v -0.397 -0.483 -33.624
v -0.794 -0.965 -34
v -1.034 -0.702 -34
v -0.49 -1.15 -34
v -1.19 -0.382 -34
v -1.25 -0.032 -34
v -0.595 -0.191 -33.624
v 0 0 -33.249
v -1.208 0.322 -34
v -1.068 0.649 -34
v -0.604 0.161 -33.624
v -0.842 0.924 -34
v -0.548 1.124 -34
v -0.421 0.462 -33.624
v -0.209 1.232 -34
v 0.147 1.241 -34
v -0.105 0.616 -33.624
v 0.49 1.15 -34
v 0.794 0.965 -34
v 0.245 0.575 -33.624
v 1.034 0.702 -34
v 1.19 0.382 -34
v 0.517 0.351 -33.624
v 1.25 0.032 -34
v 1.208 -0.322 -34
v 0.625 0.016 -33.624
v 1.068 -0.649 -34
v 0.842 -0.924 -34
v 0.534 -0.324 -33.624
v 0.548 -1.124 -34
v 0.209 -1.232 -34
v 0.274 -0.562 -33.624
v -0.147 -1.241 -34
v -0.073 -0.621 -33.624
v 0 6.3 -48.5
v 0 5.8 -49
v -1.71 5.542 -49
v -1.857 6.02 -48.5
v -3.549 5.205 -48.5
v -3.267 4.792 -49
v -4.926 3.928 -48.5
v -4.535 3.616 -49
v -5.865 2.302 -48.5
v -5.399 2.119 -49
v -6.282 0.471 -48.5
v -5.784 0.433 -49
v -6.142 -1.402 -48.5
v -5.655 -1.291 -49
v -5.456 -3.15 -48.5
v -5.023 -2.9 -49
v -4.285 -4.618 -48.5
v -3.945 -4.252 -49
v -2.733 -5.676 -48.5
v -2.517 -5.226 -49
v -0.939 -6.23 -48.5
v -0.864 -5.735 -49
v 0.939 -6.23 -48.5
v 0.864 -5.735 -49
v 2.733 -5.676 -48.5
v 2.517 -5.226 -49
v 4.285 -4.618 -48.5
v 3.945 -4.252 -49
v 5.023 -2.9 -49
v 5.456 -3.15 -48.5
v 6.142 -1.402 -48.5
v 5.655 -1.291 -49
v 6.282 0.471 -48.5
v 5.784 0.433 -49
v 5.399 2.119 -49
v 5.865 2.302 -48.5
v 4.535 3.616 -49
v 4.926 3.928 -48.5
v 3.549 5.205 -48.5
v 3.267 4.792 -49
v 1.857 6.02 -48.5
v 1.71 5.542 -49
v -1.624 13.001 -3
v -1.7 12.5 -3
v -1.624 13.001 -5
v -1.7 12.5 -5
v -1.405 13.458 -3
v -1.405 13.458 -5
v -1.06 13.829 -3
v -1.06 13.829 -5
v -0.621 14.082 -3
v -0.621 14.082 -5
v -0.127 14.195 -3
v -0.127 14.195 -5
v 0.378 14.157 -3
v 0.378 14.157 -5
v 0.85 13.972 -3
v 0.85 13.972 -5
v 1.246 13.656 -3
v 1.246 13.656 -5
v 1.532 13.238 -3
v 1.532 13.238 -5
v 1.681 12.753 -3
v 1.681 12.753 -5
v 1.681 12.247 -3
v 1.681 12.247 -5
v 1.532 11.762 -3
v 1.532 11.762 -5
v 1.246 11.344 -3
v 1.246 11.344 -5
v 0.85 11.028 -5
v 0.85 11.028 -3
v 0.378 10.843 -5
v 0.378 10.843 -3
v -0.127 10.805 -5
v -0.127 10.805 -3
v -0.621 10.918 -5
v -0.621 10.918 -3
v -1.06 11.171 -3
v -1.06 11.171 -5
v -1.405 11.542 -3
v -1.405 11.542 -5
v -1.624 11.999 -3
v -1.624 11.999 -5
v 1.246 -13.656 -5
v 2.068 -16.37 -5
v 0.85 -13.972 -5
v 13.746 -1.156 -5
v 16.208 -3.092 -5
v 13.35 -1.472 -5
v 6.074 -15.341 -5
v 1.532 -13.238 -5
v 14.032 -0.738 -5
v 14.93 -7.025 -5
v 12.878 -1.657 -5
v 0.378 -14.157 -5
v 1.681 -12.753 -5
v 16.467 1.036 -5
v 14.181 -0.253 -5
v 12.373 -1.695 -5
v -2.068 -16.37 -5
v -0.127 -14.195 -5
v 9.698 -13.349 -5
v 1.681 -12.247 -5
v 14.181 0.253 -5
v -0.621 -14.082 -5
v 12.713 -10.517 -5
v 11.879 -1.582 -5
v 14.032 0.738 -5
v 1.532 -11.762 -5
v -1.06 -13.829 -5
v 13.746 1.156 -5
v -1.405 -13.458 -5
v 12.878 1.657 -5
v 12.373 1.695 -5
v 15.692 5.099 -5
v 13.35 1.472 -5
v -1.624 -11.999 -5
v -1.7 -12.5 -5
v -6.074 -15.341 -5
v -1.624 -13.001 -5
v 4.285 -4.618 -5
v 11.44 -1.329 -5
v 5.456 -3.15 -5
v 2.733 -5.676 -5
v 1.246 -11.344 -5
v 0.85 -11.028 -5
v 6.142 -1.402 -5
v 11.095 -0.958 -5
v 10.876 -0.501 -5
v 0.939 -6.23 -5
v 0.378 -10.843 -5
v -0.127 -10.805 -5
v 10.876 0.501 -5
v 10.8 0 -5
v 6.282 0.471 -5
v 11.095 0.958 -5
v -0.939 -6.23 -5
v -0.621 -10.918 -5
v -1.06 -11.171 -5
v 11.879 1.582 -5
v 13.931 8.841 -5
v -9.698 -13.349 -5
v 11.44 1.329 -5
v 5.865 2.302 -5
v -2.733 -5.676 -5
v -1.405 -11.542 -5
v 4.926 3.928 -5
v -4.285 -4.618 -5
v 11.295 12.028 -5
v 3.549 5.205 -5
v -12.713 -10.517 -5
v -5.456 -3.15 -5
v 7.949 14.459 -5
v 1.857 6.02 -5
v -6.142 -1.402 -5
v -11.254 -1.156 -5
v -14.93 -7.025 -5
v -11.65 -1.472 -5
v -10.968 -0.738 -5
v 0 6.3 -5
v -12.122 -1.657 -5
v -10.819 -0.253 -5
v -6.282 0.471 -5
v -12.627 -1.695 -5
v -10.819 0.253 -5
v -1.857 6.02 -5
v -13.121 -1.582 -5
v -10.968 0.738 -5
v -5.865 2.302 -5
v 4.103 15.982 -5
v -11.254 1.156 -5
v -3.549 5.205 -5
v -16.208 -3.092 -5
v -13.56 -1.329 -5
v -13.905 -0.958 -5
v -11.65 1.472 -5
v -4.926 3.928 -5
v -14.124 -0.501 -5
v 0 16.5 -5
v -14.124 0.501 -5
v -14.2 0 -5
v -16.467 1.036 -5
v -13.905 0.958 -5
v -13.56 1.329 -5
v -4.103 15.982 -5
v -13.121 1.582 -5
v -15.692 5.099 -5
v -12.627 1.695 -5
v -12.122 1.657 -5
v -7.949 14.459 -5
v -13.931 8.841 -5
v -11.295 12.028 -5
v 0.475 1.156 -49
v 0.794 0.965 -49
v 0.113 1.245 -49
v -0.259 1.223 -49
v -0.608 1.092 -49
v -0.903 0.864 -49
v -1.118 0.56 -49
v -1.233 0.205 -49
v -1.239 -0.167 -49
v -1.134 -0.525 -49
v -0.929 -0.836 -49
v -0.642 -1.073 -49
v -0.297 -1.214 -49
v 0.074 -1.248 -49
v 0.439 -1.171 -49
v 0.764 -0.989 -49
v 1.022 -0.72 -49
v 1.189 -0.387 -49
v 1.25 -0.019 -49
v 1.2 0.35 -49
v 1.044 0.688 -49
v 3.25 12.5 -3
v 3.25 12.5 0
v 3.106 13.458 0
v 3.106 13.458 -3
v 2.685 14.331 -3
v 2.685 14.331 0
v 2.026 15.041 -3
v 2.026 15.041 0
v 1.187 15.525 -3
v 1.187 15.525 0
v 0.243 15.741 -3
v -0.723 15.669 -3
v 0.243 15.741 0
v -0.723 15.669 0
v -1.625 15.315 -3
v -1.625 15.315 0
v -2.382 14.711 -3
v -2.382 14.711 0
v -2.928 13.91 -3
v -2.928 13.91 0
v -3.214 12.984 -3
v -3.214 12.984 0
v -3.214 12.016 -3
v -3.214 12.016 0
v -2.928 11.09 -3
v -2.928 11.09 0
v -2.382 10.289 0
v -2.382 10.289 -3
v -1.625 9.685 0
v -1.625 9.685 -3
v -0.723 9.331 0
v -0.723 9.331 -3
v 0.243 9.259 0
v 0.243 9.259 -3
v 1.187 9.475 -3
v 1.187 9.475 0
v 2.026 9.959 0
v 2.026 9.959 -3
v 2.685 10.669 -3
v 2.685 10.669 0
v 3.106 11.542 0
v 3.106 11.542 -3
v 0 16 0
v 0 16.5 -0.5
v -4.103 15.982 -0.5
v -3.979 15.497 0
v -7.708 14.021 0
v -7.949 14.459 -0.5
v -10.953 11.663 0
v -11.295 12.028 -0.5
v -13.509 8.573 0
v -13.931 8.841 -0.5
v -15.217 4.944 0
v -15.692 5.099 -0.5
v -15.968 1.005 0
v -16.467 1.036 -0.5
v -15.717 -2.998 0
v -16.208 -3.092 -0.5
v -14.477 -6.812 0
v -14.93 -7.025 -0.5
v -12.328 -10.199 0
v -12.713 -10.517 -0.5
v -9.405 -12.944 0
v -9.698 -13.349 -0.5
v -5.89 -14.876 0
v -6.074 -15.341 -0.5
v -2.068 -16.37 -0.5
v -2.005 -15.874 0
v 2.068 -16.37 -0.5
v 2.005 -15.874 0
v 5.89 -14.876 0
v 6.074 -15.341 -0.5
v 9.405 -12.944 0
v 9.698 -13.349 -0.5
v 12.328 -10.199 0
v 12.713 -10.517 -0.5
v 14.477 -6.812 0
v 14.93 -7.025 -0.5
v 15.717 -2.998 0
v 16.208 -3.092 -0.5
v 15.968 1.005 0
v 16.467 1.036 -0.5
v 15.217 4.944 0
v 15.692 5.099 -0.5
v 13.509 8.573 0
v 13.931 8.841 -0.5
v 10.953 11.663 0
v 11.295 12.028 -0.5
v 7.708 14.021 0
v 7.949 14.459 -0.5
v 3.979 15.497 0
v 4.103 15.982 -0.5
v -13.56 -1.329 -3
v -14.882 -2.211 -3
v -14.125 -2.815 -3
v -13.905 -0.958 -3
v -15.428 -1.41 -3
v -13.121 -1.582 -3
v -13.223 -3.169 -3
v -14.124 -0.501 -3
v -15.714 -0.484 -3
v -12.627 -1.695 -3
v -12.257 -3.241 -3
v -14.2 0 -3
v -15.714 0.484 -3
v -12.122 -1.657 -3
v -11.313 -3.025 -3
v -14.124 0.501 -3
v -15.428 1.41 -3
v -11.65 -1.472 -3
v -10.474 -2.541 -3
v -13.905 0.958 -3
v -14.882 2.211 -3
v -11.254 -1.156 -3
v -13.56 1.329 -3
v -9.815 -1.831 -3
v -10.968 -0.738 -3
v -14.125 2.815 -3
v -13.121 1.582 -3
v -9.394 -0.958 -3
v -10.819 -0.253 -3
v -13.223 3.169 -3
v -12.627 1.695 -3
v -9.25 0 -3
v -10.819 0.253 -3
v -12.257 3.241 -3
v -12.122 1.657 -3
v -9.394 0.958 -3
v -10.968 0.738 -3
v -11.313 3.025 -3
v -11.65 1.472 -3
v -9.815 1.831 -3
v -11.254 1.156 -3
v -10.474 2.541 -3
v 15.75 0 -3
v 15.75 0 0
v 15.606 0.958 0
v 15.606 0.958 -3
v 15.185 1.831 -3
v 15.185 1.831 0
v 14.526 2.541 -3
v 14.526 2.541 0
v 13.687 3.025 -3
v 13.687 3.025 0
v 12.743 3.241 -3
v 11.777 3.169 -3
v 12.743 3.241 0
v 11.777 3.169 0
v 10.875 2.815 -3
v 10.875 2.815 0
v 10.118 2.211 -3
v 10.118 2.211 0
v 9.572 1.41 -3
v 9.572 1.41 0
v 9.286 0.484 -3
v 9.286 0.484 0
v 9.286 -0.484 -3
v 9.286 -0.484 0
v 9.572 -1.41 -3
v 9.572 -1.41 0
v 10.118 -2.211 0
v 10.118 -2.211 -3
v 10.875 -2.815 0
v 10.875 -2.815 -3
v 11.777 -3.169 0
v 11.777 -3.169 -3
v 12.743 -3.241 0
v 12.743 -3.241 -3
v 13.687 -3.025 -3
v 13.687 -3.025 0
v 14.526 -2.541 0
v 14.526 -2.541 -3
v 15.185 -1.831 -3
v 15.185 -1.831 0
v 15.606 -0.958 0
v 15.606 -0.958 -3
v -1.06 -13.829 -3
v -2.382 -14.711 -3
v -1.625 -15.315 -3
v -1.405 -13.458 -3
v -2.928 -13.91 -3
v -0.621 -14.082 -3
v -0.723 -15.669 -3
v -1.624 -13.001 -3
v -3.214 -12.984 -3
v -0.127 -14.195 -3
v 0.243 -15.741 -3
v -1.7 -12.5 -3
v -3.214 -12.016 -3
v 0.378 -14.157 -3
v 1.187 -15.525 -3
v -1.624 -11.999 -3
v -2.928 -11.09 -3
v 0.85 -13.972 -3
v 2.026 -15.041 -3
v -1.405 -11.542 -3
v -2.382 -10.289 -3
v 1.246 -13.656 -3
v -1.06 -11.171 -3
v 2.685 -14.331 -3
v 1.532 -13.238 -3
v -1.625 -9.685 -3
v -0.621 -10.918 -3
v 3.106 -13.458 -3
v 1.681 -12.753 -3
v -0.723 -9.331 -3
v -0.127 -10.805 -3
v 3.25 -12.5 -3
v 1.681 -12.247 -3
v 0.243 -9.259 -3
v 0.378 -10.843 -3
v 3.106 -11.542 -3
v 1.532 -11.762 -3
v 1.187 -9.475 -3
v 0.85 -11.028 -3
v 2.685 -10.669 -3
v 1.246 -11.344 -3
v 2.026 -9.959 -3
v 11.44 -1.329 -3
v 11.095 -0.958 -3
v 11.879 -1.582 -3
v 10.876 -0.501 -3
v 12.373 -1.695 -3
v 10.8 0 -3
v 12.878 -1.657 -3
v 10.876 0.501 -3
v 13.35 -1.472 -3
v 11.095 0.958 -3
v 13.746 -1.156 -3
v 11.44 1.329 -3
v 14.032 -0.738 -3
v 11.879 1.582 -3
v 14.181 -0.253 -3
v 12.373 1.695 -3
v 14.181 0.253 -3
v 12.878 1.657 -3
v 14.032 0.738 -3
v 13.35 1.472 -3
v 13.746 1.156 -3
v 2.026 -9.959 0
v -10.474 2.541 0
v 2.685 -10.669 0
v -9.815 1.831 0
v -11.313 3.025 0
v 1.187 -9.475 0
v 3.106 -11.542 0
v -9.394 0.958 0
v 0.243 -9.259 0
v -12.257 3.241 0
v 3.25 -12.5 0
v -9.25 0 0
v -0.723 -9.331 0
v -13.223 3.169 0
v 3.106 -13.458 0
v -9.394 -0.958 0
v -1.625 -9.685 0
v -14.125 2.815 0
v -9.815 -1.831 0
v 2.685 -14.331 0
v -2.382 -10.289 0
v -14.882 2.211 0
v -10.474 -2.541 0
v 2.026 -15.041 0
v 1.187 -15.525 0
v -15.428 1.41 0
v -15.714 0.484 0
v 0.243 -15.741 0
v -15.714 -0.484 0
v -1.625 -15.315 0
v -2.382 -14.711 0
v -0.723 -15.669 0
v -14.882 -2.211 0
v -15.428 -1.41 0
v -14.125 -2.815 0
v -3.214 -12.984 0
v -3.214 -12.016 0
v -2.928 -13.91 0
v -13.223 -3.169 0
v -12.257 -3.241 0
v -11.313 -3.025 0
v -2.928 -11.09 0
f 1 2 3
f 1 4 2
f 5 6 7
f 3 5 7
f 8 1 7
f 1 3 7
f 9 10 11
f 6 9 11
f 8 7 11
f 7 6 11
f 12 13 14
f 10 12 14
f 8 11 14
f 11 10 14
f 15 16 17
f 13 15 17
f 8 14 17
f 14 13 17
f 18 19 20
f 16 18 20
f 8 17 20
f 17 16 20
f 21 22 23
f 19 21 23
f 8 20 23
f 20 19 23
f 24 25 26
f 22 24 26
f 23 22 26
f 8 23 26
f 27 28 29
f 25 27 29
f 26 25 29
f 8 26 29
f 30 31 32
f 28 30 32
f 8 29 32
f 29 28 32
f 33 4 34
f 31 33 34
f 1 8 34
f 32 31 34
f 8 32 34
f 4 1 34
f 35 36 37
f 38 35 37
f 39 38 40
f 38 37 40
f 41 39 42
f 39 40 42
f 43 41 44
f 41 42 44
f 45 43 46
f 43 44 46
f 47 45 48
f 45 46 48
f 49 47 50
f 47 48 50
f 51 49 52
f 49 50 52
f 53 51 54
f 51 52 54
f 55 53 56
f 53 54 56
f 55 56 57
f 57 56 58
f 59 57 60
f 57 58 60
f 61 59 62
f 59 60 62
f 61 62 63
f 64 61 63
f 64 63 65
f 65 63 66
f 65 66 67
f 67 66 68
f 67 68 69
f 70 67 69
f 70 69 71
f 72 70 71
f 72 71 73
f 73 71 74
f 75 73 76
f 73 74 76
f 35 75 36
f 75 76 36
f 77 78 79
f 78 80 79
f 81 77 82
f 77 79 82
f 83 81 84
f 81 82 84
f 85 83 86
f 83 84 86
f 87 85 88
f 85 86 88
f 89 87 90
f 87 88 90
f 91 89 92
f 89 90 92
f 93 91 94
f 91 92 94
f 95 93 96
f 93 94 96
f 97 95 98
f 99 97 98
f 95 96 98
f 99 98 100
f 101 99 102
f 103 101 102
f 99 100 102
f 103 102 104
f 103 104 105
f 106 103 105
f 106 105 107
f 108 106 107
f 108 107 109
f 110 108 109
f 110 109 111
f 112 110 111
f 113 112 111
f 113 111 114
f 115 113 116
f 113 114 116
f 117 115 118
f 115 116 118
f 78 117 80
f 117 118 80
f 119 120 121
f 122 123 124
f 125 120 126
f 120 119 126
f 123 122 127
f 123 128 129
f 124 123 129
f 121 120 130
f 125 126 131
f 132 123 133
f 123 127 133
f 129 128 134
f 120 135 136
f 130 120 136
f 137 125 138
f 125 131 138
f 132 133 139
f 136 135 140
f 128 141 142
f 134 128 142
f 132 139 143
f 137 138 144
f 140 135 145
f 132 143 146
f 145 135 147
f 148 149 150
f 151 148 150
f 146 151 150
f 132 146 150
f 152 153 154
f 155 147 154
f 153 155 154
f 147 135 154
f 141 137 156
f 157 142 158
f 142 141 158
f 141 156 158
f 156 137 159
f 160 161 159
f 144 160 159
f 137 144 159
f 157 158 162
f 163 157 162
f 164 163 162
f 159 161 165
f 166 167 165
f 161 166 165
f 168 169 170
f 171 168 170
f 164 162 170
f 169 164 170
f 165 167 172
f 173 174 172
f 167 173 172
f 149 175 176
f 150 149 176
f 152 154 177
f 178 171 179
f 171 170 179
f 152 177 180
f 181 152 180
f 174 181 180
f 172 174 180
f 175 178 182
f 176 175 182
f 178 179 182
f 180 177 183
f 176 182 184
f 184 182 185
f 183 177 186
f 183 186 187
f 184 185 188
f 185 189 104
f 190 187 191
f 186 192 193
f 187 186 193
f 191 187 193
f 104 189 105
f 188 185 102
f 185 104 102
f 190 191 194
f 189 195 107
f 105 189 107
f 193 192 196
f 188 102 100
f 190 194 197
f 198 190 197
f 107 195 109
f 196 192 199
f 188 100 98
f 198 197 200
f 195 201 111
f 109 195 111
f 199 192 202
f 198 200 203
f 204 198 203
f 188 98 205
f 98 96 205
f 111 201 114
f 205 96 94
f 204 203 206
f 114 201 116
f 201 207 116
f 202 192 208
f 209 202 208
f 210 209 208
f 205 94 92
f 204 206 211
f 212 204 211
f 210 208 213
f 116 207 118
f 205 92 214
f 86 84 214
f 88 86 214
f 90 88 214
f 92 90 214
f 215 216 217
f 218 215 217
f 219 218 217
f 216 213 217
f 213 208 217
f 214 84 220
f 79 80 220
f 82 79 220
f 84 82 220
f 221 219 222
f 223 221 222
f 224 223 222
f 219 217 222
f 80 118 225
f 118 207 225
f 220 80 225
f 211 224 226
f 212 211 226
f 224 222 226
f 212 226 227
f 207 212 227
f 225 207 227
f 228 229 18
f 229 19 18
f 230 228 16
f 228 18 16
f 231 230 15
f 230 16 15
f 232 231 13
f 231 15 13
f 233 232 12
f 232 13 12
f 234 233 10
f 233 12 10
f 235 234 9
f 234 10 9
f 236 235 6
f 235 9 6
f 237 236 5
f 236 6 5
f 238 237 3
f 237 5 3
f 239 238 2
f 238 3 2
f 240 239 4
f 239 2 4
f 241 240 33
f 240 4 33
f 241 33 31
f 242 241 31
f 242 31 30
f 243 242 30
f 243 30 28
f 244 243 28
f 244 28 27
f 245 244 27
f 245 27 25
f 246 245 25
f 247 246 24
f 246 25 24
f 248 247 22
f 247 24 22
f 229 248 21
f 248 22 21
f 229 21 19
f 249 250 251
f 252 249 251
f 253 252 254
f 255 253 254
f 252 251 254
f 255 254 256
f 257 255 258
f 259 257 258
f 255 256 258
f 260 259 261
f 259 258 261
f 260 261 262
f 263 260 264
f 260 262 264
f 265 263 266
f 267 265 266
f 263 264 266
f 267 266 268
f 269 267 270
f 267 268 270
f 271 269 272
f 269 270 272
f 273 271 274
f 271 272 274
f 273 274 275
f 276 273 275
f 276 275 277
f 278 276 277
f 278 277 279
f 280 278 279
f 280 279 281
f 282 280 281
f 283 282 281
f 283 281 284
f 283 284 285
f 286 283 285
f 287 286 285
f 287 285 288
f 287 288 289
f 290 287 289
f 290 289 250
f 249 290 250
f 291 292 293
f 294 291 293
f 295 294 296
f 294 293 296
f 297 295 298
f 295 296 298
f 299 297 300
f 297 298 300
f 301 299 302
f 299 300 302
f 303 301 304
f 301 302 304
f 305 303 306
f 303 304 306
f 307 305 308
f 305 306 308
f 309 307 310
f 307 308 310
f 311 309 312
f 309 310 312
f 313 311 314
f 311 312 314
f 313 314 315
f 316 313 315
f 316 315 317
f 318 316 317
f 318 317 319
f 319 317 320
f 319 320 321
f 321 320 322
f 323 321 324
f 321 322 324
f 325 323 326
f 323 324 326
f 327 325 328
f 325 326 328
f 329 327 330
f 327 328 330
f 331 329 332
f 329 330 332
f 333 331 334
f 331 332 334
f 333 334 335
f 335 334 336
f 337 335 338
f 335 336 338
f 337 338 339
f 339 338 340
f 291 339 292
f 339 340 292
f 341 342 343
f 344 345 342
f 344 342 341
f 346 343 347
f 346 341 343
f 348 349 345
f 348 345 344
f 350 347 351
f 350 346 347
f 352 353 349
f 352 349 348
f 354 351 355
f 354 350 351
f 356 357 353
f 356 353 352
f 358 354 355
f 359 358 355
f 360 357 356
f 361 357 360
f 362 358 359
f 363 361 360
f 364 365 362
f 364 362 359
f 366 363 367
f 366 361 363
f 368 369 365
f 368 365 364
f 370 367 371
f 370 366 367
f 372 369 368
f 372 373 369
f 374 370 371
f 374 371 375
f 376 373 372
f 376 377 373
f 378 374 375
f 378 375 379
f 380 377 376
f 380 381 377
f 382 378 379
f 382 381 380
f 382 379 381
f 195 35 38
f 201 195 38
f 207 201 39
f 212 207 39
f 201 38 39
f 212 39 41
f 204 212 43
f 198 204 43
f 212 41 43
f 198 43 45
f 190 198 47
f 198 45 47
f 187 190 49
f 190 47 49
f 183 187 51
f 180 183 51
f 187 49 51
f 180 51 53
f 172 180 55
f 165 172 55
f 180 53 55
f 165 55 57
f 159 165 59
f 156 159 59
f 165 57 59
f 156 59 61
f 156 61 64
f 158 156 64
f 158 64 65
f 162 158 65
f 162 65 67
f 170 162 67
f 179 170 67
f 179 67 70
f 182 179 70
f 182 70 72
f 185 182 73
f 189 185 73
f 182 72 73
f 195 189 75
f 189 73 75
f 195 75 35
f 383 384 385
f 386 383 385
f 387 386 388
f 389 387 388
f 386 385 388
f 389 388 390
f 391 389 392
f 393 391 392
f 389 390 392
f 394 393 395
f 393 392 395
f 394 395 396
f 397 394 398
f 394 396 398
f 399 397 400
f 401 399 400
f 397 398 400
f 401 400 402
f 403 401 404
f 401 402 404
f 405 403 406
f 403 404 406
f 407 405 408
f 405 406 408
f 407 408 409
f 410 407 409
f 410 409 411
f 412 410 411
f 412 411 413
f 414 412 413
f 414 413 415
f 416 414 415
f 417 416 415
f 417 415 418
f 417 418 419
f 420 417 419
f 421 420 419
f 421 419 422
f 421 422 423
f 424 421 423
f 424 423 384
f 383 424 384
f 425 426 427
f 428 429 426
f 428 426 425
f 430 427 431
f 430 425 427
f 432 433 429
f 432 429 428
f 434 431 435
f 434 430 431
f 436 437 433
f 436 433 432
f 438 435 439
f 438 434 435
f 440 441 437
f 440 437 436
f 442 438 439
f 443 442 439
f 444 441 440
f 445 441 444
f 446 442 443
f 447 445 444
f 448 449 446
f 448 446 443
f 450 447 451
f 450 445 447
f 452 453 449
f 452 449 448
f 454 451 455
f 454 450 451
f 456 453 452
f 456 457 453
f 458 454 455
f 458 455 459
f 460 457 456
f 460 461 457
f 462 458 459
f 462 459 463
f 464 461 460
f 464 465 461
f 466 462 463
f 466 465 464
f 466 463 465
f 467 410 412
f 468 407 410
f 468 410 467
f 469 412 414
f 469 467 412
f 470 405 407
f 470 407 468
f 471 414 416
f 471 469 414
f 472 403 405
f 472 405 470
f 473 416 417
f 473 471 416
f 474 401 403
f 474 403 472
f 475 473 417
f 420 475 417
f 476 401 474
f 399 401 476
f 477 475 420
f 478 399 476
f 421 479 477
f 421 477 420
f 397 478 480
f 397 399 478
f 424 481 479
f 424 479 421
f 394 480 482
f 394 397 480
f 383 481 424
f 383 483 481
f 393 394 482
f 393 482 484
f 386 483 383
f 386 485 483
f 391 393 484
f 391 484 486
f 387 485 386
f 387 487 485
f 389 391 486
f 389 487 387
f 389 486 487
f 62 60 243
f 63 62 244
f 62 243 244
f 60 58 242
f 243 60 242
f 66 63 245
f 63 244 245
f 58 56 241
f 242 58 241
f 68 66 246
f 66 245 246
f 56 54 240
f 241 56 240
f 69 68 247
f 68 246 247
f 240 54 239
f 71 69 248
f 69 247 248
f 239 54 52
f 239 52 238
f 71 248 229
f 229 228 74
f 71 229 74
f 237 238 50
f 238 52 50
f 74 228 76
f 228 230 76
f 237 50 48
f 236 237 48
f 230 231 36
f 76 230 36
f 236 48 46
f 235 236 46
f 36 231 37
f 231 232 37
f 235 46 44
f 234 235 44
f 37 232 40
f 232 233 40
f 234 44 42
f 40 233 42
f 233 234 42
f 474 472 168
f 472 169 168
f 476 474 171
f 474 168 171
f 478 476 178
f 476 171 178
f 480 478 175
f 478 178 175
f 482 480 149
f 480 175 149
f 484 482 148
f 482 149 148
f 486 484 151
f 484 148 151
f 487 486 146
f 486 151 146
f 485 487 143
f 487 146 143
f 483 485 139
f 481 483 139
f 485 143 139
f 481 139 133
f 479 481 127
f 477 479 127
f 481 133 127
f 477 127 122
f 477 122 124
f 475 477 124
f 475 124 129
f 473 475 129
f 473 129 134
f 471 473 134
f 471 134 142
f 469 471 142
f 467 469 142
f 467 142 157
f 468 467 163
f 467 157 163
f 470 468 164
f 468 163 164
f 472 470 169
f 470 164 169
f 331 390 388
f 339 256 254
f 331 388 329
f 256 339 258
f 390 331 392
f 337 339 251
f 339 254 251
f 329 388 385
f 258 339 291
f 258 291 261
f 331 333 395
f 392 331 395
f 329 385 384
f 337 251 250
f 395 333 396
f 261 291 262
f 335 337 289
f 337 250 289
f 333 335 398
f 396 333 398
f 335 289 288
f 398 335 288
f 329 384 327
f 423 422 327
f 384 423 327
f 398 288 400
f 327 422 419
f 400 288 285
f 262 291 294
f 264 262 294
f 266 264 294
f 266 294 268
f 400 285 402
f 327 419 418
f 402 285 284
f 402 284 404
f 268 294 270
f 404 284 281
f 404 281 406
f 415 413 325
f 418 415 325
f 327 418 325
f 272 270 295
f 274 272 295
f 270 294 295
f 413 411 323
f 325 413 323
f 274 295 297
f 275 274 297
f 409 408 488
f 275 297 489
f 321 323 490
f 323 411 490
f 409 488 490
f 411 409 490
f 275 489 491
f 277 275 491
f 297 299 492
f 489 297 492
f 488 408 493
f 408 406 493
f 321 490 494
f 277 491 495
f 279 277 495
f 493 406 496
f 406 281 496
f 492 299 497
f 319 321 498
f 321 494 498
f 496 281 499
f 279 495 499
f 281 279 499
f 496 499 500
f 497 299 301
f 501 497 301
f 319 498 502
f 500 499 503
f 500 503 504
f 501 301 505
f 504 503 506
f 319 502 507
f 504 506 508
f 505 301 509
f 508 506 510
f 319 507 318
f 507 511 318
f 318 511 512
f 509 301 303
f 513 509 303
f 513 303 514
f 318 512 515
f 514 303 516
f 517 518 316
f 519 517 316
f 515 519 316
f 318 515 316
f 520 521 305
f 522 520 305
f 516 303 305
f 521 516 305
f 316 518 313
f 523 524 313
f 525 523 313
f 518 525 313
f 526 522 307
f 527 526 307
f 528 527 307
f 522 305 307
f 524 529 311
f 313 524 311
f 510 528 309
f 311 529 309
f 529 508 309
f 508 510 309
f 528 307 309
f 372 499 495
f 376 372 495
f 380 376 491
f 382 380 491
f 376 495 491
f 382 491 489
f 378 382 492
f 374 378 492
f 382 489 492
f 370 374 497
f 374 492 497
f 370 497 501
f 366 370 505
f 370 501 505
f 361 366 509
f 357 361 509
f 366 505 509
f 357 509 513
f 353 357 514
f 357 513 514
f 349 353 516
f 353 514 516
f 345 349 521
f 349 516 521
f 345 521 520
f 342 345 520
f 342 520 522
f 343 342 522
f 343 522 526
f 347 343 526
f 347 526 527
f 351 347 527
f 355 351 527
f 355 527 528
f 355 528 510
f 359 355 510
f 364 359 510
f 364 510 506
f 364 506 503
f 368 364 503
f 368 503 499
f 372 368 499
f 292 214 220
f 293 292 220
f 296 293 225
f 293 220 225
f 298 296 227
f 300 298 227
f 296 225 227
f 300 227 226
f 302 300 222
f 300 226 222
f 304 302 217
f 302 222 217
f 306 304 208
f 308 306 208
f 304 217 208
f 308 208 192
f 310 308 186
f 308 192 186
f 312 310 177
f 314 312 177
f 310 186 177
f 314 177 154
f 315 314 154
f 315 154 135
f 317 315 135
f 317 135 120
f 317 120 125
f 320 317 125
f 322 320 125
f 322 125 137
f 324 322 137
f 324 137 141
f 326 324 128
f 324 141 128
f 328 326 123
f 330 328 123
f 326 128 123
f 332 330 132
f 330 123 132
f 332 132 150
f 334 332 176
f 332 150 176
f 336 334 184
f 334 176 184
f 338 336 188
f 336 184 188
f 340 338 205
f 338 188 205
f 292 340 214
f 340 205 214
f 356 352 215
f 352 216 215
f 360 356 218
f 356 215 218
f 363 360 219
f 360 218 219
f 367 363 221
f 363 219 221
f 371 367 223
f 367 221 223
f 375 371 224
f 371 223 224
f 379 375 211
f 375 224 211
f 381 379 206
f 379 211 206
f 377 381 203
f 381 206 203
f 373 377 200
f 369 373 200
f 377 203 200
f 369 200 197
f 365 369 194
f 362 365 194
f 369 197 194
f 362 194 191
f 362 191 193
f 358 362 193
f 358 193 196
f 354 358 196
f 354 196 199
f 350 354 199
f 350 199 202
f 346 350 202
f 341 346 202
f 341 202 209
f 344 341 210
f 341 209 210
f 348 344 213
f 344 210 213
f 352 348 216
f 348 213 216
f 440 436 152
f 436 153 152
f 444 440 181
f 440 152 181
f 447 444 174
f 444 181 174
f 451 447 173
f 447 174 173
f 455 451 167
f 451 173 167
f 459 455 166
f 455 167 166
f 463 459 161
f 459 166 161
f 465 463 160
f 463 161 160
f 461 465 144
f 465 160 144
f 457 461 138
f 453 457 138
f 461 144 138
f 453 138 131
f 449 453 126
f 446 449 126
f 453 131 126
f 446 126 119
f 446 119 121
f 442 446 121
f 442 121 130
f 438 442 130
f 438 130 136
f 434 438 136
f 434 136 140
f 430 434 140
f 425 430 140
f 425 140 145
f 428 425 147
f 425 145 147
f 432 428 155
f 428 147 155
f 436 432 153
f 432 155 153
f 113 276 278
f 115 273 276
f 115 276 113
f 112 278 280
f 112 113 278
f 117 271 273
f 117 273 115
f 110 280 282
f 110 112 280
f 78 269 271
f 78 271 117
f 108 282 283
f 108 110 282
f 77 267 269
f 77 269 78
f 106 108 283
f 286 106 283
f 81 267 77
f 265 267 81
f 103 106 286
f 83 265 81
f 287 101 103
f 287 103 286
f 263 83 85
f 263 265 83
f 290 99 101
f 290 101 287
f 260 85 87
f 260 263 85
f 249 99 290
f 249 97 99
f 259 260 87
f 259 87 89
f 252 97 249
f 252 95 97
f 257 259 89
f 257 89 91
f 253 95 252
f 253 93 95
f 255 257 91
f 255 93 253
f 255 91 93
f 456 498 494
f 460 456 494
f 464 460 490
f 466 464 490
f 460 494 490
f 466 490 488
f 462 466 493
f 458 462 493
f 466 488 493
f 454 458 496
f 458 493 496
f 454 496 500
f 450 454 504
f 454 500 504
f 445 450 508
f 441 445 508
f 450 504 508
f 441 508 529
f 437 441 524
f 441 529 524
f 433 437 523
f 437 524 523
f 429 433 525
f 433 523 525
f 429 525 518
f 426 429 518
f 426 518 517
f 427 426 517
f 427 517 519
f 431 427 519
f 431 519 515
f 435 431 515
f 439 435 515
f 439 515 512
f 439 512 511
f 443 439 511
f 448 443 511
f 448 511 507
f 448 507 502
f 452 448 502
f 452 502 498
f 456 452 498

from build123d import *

# Parameters (mm, degrees)
HOLE_WIZARD_M31_D           = 3.4
HOLE_WIZARD_M31_CBORE_D     = 6.5
HOLE_WIZARD_M31_CBORE_DEPTH = 3
M3X0_51_D                   = 2.5
M3X0_51_DEPTH               = 15
M3X0_51_TIP                 = 0.751075774
CHAMFER_1_SIZE              = 0.5


with BuildPart() as part:
    # Эскиз2 → Повернуть1 (revolve)
    with BuildSketch(Plane(origin=(0, 0, 0), x_dir=(0, 0, -1), z_dir=(1, 0, 0))):
        Polygon((0, 0), (0, 16.5), (5, 16.5), (5, 6.3), (49, 6.3), (49, 0), align=None)
    revolve(axis=Axis((0, 0, -49), (0, 0, 1)))

    # Цековка для винта с внутренним шестигранником M31 (through all)
    with Locations(Plane.XY):
        with Locations((-12.5, 0), (0, 12.5), (12.5, 0), (0, -12.5)):
            CounterBoreHole(HOLE_WIZARD_M31_D / 2, HOLE_WIZARD_M31_CBORE_D / 2, HOLE_WIZARD_M31_CBORE_DEPTH)

    # Отверстие обработанное метчиком M3x0.51
    with Locations(Plane(origin=(2.706733298, -7.232806727, -49), x_dir=(-0.635524995, -0.772080294, 0), z_dir=(0, 0, -1))):
        with Locations((-3.864110878, 6.686444901)):
            Hole(M3X0_51_D / 2, depth=M3X0_51_DEPTH)
            with Locations((0, 0, -(M3X0_51_DEPTH + M3X0_51_TIP / 2))):  # 118° drill point
                Cone(0, M3X0_51_D / 2, M3X0_51_TIP, mode=Mode.SUBTRACT)

    # Фаска1
    chamfer_1_edges = [part.edges().sort_by_distance(p)[0] for p in [
        (0, -6.3, -49),
        (0, -16.5, 0),
    ]]
    chamfer(chamfer_1_edges, length=CHAMFER_1_SIZE)


solid = part.part
